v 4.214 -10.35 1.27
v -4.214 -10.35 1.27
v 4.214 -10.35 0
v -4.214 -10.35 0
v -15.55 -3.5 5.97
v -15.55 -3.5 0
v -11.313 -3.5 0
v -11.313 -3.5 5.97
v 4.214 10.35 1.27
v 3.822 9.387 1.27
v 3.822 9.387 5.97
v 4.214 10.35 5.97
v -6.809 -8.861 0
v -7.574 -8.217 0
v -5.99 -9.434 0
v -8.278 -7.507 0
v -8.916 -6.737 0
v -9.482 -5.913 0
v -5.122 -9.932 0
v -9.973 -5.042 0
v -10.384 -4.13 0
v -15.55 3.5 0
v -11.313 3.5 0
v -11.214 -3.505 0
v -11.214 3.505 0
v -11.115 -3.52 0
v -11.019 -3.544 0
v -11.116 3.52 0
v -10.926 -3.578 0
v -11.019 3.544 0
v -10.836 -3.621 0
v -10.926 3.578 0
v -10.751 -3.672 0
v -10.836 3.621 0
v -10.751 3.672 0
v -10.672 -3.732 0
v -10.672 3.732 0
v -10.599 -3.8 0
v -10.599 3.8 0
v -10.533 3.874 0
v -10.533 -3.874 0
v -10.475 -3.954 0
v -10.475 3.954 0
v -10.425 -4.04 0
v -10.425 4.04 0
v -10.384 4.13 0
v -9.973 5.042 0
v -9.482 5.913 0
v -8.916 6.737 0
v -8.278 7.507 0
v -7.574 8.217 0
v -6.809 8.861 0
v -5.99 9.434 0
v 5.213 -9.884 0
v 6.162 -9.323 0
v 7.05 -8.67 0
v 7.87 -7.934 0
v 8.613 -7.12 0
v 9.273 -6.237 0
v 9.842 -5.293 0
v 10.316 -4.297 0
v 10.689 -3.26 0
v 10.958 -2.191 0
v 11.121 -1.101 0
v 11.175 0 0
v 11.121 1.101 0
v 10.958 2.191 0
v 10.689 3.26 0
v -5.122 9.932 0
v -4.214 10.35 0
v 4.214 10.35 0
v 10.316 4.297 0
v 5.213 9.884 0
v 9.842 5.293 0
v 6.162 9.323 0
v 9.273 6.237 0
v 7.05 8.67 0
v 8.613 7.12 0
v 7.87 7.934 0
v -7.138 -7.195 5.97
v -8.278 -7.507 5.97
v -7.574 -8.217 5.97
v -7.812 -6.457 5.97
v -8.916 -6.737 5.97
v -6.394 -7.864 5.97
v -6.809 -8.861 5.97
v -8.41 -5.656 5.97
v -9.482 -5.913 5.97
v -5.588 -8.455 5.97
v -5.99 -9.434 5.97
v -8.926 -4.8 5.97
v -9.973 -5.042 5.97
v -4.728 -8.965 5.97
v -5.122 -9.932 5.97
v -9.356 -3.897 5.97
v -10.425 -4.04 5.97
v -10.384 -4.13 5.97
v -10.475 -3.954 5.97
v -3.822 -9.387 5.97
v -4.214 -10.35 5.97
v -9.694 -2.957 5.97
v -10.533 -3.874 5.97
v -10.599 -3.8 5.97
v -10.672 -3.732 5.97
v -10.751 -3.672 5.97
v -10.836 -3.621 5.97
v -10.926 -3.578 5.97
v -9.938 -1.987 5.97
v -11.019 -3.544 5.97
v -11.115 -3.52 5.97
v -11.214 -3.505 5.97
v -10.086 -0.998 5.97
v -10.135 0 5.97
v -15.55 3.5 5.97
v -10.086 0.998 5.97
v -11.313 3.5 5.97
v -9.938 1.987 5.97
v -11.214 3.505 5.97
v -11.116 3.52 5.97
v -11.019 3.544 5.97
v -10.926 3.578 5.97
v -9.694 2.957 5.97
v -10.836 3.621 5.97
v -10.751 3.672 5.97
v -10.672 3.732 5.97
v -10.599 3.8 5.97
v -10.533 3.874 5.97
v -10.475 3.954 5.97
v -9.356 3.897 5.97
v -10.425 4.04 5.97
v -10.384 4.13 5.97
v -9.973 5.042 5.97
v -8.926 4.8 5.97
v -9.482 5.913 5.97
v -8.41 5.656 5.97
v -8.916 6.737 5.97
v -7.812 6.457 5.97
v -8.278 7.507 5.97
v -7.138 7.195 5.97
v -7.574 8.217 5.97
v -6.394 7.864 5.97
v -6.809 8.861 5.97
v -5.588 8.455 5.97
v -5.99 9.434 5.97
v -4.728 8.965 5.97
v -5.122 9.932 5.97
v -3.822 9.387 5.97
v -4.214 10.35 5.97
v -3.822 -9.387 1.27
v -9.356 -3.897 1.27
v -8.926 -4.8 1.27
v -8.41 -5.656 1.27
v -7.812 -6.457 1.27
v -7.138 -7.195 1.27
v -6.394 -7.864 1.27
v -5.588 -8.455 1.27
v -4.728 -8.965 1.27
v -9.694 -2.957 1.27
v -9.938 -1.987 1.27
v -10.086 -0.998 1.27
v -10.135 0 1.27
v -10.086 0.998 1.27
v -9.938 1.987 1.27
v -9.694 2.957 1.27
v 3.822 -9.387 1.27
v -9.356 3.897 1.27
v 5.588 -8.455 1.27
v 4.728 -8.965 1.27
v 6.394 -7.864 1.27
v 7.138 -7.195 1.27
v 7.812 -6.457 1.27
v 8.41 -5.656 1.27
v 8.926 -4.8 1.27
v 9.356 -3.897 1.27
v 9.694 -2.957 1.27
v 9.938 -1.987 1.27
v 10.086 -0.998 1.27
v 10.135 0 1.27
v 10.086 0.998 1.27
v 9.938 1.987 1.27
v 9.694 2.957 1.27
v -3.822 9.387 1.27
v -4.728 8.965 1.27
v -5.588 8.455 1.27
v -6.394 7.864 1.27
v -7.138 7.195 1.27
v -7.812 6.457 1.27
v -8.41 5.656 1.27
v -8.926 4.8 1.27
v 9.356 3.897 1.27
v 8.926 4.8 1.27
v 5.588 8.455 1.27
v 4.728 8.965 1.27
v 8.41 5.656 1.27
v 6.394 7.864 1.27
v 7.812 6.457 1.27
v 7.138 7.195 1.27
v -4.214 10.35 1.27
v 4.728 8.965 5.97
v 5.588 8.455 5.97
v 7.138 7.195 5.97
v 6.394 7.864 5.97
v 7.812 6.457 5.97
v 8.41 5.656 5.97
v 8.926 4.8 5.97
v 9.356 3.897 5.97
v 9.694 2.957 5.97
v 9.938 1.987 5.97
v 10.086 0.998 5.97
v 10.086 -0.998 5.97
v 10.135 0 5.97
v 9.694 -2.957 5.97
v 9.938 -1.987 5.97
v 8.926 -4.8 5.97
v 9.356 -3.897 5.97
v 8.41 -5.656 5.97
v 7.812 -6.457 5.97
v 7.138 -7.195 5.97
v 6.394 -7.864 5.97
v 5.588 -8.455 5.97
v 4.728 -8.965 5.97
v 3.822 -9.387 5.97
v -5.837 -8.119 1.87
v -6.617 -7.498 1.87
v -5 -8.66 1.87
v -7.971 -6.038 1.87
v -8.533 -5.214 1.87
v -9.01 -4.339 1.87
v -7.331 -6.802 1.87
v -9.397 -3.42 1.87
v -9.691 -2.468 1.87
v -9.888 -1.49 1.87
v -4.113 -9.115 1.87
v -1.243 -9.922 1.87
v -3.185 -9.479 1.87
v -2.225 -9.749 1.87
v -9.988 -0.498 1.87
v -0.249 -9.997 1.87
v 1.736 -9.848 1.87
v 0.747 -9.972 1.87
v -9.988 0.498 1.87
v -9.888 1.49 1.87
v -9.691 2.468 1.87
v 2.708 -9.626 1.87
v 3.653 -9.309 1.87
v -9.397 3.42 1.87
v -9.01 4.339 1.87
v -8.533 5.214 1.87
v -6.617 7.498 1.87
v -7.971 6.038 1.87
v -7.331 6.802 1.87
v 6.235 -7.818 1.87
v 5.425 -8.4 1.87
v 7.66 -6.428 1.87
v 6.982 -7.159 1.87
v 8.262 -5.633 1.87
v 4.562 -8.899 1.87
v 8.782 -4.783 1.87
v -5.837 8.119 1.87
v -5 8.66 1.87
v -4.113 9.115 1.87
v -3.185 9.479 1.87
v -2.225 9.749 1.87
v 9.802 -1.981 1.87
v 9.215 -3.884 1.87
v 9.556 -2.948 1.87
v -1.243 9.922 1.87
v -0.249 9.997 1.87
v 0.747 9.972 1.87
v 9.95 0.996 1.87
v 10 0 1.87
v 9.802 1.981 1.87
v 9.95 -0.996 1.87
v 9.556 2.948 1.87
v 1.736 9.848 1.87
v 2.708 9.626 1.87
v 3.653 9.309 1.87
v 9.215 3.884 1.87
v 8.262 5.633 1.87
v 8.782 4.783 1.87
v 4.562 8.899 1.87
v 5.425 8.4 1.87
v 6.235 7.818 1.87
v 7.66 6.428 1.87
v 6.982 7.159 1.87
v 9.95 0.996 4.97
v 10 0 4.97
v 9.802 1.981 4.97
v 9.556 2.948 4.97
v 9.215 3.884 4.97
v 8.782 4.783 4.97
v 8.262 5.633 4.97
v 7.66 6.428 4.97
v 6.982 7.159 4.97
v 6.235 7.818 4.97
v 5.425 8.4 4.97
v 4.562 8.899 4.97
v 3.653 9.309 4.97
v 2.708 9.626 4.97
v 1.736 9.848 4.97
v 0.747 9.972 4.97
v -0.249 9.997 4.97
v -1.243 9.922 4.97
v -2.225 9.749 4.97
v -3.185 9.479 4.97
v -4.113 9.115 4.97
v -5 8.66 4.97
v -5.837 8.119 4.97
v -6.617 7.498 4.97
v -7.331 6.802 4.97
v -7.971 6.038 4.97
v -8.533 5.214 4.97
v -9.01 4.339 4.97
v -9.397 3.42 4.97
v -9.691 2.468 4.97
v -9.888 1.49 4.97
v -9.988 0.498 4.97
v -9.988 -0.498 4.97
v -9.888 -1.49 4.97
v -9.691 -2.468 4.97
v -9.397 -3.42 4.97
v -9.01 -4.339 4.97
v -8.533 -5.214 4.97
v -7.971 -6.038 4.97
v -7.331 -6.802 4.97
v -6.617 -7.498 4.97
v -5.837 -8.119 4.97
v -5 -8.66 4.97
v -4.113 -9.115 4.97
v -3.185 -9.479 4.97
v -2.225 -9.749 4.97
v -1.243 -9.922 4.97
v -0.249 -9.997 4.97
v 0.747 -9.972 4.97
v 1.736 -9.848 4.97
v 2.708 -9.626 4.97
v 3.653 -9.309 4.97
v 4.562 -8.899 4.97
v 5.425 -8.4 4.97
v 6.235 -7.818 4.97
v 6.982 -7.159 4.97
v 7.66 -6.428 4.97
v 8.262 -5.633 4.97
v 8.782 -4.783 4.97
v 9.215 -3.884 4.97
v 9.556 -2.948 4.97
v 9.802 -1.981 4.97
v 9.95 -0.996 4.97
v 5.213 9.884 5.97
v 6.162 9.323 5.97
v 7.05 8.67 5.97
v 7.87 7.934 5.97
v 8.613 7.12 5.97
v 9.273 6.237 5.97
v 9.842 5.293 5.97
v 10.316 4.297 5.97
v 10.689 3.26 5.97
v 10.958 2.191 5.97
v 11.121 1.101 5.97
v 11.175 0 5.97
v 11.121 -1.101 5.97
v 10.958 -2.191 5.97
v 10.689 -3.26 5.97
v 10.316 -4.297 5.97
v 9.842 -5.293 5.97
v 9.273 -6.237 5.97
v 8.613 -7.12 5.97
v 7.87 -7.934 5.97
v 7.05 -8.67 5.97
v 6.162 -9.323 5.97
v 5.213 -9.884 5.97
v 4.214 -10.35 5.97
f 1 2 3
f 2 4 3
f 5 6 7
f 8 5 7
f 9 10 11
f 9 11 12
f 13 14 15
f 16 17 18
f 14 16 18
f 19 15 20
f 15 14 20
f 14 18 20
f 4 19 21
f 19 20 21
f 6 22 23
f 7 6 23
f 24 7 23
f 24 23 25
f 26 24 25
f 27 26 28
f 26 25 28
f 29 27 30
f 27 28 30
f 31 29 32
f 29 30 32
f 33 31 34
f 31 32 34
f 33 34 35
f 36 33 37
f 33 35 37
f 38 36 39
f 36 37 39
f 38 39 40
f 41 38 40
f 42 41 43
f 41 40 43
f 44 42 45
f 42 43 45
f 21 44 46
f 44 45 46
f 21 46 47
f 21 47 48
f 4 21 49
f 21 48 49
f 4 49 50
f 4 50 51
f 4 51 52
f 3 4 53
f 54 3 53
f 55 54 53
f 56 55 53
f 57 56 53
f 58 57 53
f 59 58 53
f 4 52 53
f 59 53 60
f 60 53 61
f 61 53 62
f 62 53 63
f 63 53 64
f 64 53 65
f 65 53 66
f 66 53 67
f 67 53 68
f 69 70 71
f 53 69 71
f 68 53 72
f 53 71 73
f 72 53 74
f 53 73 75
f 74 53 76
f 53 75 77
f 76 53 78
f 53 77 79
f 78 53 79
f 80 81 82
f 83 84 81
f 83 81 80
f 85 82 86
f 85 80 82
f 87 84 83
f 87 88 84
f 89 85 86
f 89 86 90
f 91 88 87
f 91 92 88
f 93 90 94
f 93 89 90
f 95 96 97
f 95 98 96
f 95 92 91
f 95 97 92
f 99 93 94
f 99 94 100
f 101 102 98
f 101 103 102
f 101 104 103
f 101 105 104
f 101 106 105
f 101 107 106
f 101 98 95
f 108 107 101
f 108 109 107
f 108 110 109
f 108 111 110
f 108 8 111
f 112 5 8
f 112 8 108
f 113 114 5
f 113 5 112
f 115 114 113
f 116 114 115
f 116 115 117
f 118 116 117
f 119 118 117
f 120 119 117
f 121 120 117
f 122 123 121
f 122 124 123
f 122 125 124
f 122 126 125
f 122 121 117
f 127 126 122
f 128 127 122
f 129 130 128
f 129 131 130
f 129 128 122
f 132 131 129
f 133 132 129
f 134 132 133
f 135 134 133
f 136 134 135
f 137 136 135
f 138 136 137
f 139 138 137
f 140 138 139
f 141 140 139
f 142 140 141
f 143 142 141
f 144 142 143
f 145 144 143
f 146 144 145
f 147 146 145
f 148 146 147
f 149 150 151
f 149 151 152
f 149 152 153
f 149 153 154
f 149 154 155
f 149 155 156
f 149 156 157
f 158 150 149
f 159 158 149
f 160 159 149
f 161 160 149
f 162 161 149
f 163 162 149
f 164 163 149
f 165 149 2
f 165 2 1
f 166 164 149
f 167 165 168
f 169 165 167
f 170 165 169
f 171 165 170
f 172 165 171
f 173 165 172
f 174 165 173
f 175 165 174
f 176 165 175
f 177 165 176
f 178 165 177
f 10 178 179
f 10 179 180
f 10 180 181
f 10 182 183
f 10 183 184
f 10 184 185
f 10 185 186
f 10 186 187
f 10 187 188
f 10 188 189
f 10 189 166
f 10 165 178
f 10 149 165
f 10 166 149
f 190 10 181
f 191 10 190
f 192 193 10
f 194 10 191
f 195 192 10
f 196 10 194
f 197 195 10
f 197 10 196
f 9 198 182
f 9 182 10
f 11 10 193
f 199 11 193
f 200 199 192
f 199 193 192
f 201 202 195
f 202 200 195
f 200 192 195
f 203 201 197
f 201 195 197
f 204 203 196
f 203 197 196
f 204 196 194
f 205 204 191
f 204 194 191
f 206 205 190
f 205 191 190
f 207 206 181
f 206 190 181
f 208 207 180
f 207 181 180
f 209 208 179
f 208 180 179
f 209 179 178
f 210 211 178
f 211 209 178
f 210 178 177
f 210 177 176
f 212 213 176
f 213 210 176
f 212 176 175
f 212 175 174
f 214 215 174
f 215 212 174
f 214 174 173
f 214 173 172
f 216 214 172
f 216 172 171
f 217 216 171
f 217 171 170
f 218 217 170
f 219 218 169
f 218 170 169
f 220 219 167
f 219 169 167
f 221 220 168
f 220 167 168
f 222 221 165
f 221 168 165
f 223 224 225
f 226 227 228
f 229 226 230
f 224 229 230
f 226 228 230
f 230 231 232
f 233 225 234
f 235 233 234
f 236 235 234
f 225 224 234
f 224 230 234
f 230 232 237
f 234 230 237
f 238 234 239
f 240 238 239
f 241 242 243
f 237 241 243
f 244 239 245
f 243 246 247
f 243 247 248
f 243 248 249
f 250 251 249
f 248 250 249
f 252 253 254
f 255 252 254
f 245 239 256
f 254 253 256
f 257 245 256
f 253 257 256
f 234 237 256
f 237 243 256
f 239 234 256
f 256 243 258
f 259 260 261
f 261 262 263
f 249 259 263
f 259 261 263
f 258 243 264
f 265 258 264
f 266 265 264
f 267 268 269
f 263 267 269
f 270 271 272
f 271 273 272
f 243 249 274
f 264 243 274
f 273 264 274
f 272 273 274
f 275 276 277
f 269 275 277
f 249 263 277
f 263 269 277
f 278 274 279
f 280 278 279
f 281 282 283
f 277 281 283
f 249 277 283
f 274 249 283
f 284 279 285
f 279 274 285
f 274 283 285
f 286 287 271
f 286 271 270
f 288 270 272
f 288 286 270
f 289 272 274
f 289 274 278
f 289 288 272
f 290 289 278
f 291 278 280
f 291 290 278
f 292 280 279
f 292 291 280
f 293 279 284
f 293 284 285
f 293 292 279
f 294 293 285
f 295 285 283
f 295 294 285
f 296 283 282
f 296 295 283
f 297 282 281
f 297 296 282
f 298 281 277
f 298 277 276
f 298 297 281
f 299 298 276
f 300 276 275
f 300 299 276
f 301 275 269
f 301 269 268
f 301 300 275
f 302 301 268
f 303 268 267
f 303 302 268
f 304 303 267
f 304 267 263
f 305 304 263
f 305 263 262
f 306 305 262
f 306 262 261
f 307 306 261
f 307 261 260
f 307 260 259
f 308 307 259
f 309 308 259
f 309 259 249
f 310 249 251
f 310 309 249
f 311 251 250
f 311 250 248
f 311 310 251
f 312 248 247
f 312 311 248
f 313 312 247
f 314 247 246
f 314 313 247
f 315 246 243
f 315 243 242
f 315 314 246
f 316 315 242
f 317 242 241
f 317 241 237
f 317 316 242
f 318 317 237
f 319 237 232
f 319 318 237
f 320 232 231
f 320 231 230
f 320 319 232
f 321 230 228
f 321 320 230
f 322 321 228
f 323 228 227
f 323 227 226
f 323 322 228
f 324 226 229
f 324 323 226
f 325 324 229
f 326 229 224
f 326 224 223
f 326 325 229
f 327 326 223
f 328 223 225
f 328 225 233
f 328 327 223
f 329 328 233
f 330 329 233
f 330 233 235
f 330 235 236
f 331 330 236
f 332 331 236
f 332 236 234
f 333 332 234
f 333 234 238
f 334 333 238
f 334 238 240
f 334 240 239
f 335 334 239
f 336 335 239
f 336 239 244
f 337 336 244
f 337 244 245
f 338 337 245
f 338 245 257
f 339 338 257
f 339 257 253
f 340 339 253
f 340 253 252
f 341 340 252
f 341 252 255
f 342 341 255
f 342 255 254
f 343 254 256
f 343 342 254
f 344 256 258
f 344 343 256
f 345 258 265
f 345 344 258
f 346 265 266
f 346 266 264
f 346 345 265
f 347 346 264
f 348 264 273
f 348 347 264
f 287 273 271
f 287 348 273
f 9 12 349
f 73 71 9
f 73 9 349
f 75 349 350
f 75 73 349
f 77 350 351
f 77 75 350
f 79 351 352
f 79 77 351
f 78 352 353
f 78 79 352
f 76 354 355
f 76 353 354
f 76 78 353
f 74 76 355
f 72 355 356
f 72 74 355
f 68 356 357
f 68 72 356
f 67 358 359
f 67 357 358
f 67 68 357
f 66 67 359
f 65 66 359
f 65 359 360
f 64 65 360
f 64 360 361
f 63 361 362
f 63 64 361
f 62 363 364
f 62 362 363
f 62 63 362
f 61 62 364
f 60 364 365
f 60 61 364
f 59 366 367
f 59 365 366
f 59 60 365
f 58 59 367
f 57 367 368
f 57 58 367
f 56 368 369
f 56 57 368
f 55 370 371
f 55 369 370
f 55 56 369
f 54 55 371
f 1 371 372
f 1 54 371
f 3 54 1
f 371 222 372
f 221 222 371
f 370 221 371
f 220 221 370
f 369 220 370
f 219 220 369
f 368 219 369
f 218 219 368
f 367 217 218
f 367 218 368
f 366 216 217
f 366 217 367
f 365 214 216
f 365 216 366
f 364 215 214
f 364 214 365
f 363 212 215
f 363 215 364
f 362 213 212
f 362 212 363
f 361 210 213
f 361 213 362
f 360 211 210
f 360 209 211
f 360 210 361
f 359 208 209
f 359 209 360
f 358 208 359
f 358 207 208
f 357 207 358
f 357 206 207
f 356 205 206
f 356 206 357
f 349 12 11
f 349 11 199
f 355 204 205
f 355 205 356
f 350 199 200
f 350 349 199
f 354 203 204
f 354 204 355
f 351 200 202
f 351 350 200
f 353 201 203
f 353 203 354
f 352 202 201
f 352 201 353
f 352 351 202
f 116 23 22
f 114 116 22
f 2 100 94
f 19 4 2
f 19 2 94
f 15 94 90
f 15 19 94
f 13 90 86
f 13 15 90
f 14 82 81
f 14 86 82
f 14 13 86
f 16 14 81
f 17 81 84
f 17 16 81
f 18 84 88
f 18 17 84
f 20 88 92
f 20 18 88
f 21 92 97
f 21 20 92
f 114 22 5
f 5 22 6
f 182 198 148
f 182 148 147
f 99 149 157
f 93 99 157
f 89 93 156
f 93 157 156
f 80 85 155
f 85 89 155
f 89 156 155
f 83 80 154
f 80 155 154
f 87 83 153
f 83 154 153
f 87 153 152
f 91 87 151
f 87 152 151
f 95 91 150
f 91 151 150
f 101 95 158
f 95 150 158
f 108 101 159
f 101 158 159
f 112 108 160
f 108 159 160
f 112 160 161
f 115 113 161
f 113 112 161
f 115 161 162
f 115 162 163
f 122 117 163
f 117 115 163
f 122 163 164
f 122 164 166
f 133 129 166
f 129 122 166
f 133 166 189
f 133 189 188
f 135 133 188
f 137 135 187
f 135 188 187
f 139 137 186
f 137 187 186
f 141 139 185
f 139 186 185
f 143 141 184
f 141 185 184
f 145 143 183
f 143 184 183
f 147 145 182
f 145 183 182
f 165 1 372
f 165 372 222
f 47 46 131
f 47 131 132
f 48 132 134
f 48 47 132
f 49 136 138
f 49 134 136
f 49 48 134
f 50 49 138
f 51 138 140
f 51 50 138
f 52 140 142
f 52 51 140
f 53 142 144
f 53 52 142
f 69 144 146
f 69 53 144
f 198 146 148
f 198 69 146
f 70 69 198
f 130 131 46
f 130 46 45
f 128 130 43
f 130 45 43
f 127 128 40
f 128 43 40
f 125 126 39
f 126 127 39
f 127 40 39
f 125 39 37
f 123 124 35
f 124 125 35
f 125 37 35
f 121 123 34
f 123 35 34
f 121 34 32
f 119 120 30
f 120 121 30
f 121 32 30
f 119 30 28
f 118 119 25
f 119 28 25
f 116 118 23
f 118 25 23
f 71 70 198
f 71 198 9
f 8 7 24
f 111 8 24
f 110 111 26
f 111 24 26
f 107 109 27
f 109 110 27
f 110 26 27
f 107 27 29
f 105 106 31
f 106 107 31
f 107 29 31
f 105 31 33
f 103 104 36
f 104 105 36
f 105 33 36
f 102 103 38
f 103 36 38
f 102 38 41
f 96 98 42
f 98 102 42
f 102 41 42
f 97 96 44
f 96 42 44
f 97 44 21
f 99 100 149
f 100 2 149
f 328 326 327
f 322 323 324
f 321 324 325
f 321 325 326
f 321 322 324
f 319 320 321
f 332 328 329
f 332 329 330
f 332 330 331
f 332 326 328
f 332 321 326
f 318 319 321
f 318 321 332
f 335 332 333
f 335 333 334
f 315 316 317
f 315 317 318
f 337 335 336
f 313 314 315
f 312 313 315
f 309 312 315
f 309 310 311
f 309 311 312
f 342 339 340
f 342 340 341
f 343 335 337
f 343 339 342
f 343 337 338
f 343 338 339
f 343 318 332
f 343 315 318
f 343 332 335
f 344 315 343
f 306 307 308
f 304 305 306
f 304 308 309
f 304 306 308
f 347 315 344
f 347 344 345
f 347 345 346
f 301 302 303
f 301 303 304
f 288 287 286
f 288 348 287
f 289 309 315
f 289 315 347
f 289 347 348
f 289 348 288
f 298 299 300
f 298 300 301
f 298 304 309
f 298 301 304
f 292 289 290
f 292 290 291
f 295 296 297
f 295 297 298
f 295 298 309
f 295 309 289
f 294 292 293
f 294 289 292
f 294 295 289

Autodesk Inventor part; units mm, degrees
ref_plane "YZ Plane" through (0, 0, 0) normal (1, 0, 0) x (0, 1, 0)
ref_plane "XZ Plane" through (0, 0, 0) normal (0, 1, 0) x (-1, 0, 0)
sketch "Skizze1" plane through (0, 0, 0) normal (0, 0, 1) x (1, 0, 0)
  line L0 (-4.214, 10.35) -> (4.214, 10.35)
  line L1 (-4.214, -10.35) -> (4.214, -10.35)
  line L2 (-11.3129, 3.5) -> (-15.55, 3.5)
  line L3 (-15.55, 3.5) -> (-15.55, -3.5)
  line L4 (-15.55, -3.5) -> (-11.3129, -3.5)
  arc A0 (-10.3837, -4.1304) -> (-4.214, -10.35) centre (0, 0) ccw
  arc A1 (-4.214, 10.35) -> (-10.3837, 4.1304) centre (0, 0) ccw
  arc A2 (4.214, -10.35) -> (4.214, 10.35) centre (0, 0) ccw
  line L5 (-15.55, 0) -> (0, 0) construction
  arc A3 (-11.3129, 3.5) -> (-10.3837, 4.1304) centre (-11.3129, 4.5) ccw
  arc A4 (-10.3837, -4.1304) -> (-11.3129, -3.5) centre (-11.3129, -4.5) ccw
  point P0 (-10.6128, -3.5)
  point P1 (-10.6128, 3.5)
  dimension "d0" = 7
  dimension "d1" = 20.7
  dimension "d2" = 11.175
  dimension "d5" = 1
  dimension "d6" = 15.55
extrude "Extrusion1" add sketch "Skizze1" along normal blind 1.27
sketch "Skizze2" plane through (0, 0, 1.27) normal (0, 0, 1) x (1, 0, 0)
  line L0 (4.214, 10.35) -> (-4.214, 10.35) projected
  arc A0 (-4.214, 10.35) -> (-10.3837, 4.1304) centre (0, 0) ccw projected
  arc A1 (-11.3129, 3.5) -> (-10.3837, 4.1304) centre (-11.3129, 4.5) ccw projected
  line L1 (-11.3129, 3.5) -> (-15.55, 3.5) projected
  line L2 (-15.55, 3.5) -> (-15.55, -3.5) projected
  line L3 (-15.55, -3.5) -> (-11.3129, -3.5) projected
  arc A2 (-10.3837, -4.1304) -> (-11.3129, -3.5) centre (-11.3129, -4.5) ccw projected
  arc A3 (-10.3837, -4.1304) -> (-4.214, -10.35) centre (0, 0) ccw projected
  line L4 (-4.214, -10.35) -> (4.214, -10.35) projected
  arc A4 (4.214, -10.35) -> (4.214, 10.35) centre (0, 0) ccw projected
  arc A5 (-3.8219, 9.3868) -> (-3.8219, -9.3868) centre (0, 0) ccw
  arc A6 (3.8219, -9.3868) -> (3.8219, 9.3868) centre (0, 0) ccw
  line L5 (-4.214, 10.35) -> (-3.8219, 9.3868)
  line L6 (3.8219, 9.3868) -> (4.214, 10.35)
  line L7 (-4.214, -10.35) -> (-3.8219, -9.3868)
  line L8 (4.214, -10.35) -> (3.8219, -9.3868)
  dimension "d7" = 10.135
extrude "Extrusion2" add sketch "Skizze2" along normal blind 4.7 contours A4 L8 A6 L6 | L5 A5 L7 A3 A2 L3 L2 L1 A1 A0
ref_plane "Arbeitsebene1" through (0, 0, 4.97) normal (0, 0, 1) x (1, 0, 0)
sketch "Skizze3" plane through (0, 0, 4.97) normal (0, 0, 1) x (1, 0, 0)
  circle A0 centre (0, 0) radius 10
  dimension "d11" = 20
extrude "Extrusion3" add sketch "Skizze3" against normal blind 3.1
properties part number "Keystone_1070"
